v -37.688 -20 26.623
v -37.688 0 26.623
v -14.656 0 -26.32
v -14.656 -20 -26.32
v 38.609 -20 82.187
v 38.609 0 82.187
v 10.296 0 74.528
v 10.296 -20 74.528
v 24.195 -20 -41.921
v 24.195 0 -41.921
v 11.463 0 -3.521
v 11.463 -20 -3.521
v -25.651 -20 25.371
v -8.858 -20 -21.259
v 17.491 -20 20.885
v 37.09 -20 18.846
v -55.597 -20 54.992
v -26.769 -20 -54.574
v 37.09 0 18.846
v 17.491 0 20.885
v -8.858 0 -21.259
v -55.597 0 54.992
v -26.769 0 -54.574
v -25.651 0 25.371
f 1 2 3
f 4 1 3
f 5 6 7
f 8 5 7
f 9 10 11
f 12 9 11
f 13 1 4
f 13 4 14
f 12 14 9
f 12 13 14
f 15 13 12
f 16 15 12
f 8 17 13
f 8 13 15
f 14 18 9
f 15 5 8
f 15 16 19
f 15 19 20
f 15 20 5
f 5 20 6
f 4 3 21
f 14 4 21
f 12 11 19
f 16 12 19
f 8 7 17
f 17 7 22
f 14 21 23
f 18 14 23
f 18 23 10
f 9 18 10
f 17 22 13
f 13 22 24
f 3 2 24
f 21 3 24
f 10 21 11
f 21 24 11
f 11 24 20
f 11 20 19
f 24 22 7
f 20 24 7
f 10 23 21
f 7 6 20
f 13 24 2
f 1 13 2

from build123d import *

# Parameters (mm, degrees)
F1_DEPTH = 20


with BuildPart() as f1:
    # F0 (on Front) → F1 (new body)
    with BuildSketch(Plane.XZ):
        Polygon((0, -4.78173), (-16.802281, 16.61918), (-25.650827, 25.3713), (-37.688062, 26.623173), (-14.656468, -26.31958), (-8.858471, -21.258901), align=None)
        Polygon((-25.650827, 25.3713), (-16.802281, 16.61918), (0, -4.78173), (-8.858471, -21.258901), (11.46337, -3.52134), (10.295821, 0), (17.490609, 20.884591), align=None)
        Polygon((-55.597428, 54.991562), (-25.650827, 25.3713), (17.490609, 20.884591), (38.609326, 82.186714), (10.295821, 74.528098), align=None)
        Polygon((37.08984, 18.846272), (17.490609, 20.884591), (10.295821, 0), (11.46337, -3.52134), align=None)
        Polygon((11.46337, -3.52134), (-8.858471, -21.258901), (-26.769133, -54.573569), (24.195176, -41.920602), align=None)
    extrude(amount=F1_DEPTH)


solid = f1.part
